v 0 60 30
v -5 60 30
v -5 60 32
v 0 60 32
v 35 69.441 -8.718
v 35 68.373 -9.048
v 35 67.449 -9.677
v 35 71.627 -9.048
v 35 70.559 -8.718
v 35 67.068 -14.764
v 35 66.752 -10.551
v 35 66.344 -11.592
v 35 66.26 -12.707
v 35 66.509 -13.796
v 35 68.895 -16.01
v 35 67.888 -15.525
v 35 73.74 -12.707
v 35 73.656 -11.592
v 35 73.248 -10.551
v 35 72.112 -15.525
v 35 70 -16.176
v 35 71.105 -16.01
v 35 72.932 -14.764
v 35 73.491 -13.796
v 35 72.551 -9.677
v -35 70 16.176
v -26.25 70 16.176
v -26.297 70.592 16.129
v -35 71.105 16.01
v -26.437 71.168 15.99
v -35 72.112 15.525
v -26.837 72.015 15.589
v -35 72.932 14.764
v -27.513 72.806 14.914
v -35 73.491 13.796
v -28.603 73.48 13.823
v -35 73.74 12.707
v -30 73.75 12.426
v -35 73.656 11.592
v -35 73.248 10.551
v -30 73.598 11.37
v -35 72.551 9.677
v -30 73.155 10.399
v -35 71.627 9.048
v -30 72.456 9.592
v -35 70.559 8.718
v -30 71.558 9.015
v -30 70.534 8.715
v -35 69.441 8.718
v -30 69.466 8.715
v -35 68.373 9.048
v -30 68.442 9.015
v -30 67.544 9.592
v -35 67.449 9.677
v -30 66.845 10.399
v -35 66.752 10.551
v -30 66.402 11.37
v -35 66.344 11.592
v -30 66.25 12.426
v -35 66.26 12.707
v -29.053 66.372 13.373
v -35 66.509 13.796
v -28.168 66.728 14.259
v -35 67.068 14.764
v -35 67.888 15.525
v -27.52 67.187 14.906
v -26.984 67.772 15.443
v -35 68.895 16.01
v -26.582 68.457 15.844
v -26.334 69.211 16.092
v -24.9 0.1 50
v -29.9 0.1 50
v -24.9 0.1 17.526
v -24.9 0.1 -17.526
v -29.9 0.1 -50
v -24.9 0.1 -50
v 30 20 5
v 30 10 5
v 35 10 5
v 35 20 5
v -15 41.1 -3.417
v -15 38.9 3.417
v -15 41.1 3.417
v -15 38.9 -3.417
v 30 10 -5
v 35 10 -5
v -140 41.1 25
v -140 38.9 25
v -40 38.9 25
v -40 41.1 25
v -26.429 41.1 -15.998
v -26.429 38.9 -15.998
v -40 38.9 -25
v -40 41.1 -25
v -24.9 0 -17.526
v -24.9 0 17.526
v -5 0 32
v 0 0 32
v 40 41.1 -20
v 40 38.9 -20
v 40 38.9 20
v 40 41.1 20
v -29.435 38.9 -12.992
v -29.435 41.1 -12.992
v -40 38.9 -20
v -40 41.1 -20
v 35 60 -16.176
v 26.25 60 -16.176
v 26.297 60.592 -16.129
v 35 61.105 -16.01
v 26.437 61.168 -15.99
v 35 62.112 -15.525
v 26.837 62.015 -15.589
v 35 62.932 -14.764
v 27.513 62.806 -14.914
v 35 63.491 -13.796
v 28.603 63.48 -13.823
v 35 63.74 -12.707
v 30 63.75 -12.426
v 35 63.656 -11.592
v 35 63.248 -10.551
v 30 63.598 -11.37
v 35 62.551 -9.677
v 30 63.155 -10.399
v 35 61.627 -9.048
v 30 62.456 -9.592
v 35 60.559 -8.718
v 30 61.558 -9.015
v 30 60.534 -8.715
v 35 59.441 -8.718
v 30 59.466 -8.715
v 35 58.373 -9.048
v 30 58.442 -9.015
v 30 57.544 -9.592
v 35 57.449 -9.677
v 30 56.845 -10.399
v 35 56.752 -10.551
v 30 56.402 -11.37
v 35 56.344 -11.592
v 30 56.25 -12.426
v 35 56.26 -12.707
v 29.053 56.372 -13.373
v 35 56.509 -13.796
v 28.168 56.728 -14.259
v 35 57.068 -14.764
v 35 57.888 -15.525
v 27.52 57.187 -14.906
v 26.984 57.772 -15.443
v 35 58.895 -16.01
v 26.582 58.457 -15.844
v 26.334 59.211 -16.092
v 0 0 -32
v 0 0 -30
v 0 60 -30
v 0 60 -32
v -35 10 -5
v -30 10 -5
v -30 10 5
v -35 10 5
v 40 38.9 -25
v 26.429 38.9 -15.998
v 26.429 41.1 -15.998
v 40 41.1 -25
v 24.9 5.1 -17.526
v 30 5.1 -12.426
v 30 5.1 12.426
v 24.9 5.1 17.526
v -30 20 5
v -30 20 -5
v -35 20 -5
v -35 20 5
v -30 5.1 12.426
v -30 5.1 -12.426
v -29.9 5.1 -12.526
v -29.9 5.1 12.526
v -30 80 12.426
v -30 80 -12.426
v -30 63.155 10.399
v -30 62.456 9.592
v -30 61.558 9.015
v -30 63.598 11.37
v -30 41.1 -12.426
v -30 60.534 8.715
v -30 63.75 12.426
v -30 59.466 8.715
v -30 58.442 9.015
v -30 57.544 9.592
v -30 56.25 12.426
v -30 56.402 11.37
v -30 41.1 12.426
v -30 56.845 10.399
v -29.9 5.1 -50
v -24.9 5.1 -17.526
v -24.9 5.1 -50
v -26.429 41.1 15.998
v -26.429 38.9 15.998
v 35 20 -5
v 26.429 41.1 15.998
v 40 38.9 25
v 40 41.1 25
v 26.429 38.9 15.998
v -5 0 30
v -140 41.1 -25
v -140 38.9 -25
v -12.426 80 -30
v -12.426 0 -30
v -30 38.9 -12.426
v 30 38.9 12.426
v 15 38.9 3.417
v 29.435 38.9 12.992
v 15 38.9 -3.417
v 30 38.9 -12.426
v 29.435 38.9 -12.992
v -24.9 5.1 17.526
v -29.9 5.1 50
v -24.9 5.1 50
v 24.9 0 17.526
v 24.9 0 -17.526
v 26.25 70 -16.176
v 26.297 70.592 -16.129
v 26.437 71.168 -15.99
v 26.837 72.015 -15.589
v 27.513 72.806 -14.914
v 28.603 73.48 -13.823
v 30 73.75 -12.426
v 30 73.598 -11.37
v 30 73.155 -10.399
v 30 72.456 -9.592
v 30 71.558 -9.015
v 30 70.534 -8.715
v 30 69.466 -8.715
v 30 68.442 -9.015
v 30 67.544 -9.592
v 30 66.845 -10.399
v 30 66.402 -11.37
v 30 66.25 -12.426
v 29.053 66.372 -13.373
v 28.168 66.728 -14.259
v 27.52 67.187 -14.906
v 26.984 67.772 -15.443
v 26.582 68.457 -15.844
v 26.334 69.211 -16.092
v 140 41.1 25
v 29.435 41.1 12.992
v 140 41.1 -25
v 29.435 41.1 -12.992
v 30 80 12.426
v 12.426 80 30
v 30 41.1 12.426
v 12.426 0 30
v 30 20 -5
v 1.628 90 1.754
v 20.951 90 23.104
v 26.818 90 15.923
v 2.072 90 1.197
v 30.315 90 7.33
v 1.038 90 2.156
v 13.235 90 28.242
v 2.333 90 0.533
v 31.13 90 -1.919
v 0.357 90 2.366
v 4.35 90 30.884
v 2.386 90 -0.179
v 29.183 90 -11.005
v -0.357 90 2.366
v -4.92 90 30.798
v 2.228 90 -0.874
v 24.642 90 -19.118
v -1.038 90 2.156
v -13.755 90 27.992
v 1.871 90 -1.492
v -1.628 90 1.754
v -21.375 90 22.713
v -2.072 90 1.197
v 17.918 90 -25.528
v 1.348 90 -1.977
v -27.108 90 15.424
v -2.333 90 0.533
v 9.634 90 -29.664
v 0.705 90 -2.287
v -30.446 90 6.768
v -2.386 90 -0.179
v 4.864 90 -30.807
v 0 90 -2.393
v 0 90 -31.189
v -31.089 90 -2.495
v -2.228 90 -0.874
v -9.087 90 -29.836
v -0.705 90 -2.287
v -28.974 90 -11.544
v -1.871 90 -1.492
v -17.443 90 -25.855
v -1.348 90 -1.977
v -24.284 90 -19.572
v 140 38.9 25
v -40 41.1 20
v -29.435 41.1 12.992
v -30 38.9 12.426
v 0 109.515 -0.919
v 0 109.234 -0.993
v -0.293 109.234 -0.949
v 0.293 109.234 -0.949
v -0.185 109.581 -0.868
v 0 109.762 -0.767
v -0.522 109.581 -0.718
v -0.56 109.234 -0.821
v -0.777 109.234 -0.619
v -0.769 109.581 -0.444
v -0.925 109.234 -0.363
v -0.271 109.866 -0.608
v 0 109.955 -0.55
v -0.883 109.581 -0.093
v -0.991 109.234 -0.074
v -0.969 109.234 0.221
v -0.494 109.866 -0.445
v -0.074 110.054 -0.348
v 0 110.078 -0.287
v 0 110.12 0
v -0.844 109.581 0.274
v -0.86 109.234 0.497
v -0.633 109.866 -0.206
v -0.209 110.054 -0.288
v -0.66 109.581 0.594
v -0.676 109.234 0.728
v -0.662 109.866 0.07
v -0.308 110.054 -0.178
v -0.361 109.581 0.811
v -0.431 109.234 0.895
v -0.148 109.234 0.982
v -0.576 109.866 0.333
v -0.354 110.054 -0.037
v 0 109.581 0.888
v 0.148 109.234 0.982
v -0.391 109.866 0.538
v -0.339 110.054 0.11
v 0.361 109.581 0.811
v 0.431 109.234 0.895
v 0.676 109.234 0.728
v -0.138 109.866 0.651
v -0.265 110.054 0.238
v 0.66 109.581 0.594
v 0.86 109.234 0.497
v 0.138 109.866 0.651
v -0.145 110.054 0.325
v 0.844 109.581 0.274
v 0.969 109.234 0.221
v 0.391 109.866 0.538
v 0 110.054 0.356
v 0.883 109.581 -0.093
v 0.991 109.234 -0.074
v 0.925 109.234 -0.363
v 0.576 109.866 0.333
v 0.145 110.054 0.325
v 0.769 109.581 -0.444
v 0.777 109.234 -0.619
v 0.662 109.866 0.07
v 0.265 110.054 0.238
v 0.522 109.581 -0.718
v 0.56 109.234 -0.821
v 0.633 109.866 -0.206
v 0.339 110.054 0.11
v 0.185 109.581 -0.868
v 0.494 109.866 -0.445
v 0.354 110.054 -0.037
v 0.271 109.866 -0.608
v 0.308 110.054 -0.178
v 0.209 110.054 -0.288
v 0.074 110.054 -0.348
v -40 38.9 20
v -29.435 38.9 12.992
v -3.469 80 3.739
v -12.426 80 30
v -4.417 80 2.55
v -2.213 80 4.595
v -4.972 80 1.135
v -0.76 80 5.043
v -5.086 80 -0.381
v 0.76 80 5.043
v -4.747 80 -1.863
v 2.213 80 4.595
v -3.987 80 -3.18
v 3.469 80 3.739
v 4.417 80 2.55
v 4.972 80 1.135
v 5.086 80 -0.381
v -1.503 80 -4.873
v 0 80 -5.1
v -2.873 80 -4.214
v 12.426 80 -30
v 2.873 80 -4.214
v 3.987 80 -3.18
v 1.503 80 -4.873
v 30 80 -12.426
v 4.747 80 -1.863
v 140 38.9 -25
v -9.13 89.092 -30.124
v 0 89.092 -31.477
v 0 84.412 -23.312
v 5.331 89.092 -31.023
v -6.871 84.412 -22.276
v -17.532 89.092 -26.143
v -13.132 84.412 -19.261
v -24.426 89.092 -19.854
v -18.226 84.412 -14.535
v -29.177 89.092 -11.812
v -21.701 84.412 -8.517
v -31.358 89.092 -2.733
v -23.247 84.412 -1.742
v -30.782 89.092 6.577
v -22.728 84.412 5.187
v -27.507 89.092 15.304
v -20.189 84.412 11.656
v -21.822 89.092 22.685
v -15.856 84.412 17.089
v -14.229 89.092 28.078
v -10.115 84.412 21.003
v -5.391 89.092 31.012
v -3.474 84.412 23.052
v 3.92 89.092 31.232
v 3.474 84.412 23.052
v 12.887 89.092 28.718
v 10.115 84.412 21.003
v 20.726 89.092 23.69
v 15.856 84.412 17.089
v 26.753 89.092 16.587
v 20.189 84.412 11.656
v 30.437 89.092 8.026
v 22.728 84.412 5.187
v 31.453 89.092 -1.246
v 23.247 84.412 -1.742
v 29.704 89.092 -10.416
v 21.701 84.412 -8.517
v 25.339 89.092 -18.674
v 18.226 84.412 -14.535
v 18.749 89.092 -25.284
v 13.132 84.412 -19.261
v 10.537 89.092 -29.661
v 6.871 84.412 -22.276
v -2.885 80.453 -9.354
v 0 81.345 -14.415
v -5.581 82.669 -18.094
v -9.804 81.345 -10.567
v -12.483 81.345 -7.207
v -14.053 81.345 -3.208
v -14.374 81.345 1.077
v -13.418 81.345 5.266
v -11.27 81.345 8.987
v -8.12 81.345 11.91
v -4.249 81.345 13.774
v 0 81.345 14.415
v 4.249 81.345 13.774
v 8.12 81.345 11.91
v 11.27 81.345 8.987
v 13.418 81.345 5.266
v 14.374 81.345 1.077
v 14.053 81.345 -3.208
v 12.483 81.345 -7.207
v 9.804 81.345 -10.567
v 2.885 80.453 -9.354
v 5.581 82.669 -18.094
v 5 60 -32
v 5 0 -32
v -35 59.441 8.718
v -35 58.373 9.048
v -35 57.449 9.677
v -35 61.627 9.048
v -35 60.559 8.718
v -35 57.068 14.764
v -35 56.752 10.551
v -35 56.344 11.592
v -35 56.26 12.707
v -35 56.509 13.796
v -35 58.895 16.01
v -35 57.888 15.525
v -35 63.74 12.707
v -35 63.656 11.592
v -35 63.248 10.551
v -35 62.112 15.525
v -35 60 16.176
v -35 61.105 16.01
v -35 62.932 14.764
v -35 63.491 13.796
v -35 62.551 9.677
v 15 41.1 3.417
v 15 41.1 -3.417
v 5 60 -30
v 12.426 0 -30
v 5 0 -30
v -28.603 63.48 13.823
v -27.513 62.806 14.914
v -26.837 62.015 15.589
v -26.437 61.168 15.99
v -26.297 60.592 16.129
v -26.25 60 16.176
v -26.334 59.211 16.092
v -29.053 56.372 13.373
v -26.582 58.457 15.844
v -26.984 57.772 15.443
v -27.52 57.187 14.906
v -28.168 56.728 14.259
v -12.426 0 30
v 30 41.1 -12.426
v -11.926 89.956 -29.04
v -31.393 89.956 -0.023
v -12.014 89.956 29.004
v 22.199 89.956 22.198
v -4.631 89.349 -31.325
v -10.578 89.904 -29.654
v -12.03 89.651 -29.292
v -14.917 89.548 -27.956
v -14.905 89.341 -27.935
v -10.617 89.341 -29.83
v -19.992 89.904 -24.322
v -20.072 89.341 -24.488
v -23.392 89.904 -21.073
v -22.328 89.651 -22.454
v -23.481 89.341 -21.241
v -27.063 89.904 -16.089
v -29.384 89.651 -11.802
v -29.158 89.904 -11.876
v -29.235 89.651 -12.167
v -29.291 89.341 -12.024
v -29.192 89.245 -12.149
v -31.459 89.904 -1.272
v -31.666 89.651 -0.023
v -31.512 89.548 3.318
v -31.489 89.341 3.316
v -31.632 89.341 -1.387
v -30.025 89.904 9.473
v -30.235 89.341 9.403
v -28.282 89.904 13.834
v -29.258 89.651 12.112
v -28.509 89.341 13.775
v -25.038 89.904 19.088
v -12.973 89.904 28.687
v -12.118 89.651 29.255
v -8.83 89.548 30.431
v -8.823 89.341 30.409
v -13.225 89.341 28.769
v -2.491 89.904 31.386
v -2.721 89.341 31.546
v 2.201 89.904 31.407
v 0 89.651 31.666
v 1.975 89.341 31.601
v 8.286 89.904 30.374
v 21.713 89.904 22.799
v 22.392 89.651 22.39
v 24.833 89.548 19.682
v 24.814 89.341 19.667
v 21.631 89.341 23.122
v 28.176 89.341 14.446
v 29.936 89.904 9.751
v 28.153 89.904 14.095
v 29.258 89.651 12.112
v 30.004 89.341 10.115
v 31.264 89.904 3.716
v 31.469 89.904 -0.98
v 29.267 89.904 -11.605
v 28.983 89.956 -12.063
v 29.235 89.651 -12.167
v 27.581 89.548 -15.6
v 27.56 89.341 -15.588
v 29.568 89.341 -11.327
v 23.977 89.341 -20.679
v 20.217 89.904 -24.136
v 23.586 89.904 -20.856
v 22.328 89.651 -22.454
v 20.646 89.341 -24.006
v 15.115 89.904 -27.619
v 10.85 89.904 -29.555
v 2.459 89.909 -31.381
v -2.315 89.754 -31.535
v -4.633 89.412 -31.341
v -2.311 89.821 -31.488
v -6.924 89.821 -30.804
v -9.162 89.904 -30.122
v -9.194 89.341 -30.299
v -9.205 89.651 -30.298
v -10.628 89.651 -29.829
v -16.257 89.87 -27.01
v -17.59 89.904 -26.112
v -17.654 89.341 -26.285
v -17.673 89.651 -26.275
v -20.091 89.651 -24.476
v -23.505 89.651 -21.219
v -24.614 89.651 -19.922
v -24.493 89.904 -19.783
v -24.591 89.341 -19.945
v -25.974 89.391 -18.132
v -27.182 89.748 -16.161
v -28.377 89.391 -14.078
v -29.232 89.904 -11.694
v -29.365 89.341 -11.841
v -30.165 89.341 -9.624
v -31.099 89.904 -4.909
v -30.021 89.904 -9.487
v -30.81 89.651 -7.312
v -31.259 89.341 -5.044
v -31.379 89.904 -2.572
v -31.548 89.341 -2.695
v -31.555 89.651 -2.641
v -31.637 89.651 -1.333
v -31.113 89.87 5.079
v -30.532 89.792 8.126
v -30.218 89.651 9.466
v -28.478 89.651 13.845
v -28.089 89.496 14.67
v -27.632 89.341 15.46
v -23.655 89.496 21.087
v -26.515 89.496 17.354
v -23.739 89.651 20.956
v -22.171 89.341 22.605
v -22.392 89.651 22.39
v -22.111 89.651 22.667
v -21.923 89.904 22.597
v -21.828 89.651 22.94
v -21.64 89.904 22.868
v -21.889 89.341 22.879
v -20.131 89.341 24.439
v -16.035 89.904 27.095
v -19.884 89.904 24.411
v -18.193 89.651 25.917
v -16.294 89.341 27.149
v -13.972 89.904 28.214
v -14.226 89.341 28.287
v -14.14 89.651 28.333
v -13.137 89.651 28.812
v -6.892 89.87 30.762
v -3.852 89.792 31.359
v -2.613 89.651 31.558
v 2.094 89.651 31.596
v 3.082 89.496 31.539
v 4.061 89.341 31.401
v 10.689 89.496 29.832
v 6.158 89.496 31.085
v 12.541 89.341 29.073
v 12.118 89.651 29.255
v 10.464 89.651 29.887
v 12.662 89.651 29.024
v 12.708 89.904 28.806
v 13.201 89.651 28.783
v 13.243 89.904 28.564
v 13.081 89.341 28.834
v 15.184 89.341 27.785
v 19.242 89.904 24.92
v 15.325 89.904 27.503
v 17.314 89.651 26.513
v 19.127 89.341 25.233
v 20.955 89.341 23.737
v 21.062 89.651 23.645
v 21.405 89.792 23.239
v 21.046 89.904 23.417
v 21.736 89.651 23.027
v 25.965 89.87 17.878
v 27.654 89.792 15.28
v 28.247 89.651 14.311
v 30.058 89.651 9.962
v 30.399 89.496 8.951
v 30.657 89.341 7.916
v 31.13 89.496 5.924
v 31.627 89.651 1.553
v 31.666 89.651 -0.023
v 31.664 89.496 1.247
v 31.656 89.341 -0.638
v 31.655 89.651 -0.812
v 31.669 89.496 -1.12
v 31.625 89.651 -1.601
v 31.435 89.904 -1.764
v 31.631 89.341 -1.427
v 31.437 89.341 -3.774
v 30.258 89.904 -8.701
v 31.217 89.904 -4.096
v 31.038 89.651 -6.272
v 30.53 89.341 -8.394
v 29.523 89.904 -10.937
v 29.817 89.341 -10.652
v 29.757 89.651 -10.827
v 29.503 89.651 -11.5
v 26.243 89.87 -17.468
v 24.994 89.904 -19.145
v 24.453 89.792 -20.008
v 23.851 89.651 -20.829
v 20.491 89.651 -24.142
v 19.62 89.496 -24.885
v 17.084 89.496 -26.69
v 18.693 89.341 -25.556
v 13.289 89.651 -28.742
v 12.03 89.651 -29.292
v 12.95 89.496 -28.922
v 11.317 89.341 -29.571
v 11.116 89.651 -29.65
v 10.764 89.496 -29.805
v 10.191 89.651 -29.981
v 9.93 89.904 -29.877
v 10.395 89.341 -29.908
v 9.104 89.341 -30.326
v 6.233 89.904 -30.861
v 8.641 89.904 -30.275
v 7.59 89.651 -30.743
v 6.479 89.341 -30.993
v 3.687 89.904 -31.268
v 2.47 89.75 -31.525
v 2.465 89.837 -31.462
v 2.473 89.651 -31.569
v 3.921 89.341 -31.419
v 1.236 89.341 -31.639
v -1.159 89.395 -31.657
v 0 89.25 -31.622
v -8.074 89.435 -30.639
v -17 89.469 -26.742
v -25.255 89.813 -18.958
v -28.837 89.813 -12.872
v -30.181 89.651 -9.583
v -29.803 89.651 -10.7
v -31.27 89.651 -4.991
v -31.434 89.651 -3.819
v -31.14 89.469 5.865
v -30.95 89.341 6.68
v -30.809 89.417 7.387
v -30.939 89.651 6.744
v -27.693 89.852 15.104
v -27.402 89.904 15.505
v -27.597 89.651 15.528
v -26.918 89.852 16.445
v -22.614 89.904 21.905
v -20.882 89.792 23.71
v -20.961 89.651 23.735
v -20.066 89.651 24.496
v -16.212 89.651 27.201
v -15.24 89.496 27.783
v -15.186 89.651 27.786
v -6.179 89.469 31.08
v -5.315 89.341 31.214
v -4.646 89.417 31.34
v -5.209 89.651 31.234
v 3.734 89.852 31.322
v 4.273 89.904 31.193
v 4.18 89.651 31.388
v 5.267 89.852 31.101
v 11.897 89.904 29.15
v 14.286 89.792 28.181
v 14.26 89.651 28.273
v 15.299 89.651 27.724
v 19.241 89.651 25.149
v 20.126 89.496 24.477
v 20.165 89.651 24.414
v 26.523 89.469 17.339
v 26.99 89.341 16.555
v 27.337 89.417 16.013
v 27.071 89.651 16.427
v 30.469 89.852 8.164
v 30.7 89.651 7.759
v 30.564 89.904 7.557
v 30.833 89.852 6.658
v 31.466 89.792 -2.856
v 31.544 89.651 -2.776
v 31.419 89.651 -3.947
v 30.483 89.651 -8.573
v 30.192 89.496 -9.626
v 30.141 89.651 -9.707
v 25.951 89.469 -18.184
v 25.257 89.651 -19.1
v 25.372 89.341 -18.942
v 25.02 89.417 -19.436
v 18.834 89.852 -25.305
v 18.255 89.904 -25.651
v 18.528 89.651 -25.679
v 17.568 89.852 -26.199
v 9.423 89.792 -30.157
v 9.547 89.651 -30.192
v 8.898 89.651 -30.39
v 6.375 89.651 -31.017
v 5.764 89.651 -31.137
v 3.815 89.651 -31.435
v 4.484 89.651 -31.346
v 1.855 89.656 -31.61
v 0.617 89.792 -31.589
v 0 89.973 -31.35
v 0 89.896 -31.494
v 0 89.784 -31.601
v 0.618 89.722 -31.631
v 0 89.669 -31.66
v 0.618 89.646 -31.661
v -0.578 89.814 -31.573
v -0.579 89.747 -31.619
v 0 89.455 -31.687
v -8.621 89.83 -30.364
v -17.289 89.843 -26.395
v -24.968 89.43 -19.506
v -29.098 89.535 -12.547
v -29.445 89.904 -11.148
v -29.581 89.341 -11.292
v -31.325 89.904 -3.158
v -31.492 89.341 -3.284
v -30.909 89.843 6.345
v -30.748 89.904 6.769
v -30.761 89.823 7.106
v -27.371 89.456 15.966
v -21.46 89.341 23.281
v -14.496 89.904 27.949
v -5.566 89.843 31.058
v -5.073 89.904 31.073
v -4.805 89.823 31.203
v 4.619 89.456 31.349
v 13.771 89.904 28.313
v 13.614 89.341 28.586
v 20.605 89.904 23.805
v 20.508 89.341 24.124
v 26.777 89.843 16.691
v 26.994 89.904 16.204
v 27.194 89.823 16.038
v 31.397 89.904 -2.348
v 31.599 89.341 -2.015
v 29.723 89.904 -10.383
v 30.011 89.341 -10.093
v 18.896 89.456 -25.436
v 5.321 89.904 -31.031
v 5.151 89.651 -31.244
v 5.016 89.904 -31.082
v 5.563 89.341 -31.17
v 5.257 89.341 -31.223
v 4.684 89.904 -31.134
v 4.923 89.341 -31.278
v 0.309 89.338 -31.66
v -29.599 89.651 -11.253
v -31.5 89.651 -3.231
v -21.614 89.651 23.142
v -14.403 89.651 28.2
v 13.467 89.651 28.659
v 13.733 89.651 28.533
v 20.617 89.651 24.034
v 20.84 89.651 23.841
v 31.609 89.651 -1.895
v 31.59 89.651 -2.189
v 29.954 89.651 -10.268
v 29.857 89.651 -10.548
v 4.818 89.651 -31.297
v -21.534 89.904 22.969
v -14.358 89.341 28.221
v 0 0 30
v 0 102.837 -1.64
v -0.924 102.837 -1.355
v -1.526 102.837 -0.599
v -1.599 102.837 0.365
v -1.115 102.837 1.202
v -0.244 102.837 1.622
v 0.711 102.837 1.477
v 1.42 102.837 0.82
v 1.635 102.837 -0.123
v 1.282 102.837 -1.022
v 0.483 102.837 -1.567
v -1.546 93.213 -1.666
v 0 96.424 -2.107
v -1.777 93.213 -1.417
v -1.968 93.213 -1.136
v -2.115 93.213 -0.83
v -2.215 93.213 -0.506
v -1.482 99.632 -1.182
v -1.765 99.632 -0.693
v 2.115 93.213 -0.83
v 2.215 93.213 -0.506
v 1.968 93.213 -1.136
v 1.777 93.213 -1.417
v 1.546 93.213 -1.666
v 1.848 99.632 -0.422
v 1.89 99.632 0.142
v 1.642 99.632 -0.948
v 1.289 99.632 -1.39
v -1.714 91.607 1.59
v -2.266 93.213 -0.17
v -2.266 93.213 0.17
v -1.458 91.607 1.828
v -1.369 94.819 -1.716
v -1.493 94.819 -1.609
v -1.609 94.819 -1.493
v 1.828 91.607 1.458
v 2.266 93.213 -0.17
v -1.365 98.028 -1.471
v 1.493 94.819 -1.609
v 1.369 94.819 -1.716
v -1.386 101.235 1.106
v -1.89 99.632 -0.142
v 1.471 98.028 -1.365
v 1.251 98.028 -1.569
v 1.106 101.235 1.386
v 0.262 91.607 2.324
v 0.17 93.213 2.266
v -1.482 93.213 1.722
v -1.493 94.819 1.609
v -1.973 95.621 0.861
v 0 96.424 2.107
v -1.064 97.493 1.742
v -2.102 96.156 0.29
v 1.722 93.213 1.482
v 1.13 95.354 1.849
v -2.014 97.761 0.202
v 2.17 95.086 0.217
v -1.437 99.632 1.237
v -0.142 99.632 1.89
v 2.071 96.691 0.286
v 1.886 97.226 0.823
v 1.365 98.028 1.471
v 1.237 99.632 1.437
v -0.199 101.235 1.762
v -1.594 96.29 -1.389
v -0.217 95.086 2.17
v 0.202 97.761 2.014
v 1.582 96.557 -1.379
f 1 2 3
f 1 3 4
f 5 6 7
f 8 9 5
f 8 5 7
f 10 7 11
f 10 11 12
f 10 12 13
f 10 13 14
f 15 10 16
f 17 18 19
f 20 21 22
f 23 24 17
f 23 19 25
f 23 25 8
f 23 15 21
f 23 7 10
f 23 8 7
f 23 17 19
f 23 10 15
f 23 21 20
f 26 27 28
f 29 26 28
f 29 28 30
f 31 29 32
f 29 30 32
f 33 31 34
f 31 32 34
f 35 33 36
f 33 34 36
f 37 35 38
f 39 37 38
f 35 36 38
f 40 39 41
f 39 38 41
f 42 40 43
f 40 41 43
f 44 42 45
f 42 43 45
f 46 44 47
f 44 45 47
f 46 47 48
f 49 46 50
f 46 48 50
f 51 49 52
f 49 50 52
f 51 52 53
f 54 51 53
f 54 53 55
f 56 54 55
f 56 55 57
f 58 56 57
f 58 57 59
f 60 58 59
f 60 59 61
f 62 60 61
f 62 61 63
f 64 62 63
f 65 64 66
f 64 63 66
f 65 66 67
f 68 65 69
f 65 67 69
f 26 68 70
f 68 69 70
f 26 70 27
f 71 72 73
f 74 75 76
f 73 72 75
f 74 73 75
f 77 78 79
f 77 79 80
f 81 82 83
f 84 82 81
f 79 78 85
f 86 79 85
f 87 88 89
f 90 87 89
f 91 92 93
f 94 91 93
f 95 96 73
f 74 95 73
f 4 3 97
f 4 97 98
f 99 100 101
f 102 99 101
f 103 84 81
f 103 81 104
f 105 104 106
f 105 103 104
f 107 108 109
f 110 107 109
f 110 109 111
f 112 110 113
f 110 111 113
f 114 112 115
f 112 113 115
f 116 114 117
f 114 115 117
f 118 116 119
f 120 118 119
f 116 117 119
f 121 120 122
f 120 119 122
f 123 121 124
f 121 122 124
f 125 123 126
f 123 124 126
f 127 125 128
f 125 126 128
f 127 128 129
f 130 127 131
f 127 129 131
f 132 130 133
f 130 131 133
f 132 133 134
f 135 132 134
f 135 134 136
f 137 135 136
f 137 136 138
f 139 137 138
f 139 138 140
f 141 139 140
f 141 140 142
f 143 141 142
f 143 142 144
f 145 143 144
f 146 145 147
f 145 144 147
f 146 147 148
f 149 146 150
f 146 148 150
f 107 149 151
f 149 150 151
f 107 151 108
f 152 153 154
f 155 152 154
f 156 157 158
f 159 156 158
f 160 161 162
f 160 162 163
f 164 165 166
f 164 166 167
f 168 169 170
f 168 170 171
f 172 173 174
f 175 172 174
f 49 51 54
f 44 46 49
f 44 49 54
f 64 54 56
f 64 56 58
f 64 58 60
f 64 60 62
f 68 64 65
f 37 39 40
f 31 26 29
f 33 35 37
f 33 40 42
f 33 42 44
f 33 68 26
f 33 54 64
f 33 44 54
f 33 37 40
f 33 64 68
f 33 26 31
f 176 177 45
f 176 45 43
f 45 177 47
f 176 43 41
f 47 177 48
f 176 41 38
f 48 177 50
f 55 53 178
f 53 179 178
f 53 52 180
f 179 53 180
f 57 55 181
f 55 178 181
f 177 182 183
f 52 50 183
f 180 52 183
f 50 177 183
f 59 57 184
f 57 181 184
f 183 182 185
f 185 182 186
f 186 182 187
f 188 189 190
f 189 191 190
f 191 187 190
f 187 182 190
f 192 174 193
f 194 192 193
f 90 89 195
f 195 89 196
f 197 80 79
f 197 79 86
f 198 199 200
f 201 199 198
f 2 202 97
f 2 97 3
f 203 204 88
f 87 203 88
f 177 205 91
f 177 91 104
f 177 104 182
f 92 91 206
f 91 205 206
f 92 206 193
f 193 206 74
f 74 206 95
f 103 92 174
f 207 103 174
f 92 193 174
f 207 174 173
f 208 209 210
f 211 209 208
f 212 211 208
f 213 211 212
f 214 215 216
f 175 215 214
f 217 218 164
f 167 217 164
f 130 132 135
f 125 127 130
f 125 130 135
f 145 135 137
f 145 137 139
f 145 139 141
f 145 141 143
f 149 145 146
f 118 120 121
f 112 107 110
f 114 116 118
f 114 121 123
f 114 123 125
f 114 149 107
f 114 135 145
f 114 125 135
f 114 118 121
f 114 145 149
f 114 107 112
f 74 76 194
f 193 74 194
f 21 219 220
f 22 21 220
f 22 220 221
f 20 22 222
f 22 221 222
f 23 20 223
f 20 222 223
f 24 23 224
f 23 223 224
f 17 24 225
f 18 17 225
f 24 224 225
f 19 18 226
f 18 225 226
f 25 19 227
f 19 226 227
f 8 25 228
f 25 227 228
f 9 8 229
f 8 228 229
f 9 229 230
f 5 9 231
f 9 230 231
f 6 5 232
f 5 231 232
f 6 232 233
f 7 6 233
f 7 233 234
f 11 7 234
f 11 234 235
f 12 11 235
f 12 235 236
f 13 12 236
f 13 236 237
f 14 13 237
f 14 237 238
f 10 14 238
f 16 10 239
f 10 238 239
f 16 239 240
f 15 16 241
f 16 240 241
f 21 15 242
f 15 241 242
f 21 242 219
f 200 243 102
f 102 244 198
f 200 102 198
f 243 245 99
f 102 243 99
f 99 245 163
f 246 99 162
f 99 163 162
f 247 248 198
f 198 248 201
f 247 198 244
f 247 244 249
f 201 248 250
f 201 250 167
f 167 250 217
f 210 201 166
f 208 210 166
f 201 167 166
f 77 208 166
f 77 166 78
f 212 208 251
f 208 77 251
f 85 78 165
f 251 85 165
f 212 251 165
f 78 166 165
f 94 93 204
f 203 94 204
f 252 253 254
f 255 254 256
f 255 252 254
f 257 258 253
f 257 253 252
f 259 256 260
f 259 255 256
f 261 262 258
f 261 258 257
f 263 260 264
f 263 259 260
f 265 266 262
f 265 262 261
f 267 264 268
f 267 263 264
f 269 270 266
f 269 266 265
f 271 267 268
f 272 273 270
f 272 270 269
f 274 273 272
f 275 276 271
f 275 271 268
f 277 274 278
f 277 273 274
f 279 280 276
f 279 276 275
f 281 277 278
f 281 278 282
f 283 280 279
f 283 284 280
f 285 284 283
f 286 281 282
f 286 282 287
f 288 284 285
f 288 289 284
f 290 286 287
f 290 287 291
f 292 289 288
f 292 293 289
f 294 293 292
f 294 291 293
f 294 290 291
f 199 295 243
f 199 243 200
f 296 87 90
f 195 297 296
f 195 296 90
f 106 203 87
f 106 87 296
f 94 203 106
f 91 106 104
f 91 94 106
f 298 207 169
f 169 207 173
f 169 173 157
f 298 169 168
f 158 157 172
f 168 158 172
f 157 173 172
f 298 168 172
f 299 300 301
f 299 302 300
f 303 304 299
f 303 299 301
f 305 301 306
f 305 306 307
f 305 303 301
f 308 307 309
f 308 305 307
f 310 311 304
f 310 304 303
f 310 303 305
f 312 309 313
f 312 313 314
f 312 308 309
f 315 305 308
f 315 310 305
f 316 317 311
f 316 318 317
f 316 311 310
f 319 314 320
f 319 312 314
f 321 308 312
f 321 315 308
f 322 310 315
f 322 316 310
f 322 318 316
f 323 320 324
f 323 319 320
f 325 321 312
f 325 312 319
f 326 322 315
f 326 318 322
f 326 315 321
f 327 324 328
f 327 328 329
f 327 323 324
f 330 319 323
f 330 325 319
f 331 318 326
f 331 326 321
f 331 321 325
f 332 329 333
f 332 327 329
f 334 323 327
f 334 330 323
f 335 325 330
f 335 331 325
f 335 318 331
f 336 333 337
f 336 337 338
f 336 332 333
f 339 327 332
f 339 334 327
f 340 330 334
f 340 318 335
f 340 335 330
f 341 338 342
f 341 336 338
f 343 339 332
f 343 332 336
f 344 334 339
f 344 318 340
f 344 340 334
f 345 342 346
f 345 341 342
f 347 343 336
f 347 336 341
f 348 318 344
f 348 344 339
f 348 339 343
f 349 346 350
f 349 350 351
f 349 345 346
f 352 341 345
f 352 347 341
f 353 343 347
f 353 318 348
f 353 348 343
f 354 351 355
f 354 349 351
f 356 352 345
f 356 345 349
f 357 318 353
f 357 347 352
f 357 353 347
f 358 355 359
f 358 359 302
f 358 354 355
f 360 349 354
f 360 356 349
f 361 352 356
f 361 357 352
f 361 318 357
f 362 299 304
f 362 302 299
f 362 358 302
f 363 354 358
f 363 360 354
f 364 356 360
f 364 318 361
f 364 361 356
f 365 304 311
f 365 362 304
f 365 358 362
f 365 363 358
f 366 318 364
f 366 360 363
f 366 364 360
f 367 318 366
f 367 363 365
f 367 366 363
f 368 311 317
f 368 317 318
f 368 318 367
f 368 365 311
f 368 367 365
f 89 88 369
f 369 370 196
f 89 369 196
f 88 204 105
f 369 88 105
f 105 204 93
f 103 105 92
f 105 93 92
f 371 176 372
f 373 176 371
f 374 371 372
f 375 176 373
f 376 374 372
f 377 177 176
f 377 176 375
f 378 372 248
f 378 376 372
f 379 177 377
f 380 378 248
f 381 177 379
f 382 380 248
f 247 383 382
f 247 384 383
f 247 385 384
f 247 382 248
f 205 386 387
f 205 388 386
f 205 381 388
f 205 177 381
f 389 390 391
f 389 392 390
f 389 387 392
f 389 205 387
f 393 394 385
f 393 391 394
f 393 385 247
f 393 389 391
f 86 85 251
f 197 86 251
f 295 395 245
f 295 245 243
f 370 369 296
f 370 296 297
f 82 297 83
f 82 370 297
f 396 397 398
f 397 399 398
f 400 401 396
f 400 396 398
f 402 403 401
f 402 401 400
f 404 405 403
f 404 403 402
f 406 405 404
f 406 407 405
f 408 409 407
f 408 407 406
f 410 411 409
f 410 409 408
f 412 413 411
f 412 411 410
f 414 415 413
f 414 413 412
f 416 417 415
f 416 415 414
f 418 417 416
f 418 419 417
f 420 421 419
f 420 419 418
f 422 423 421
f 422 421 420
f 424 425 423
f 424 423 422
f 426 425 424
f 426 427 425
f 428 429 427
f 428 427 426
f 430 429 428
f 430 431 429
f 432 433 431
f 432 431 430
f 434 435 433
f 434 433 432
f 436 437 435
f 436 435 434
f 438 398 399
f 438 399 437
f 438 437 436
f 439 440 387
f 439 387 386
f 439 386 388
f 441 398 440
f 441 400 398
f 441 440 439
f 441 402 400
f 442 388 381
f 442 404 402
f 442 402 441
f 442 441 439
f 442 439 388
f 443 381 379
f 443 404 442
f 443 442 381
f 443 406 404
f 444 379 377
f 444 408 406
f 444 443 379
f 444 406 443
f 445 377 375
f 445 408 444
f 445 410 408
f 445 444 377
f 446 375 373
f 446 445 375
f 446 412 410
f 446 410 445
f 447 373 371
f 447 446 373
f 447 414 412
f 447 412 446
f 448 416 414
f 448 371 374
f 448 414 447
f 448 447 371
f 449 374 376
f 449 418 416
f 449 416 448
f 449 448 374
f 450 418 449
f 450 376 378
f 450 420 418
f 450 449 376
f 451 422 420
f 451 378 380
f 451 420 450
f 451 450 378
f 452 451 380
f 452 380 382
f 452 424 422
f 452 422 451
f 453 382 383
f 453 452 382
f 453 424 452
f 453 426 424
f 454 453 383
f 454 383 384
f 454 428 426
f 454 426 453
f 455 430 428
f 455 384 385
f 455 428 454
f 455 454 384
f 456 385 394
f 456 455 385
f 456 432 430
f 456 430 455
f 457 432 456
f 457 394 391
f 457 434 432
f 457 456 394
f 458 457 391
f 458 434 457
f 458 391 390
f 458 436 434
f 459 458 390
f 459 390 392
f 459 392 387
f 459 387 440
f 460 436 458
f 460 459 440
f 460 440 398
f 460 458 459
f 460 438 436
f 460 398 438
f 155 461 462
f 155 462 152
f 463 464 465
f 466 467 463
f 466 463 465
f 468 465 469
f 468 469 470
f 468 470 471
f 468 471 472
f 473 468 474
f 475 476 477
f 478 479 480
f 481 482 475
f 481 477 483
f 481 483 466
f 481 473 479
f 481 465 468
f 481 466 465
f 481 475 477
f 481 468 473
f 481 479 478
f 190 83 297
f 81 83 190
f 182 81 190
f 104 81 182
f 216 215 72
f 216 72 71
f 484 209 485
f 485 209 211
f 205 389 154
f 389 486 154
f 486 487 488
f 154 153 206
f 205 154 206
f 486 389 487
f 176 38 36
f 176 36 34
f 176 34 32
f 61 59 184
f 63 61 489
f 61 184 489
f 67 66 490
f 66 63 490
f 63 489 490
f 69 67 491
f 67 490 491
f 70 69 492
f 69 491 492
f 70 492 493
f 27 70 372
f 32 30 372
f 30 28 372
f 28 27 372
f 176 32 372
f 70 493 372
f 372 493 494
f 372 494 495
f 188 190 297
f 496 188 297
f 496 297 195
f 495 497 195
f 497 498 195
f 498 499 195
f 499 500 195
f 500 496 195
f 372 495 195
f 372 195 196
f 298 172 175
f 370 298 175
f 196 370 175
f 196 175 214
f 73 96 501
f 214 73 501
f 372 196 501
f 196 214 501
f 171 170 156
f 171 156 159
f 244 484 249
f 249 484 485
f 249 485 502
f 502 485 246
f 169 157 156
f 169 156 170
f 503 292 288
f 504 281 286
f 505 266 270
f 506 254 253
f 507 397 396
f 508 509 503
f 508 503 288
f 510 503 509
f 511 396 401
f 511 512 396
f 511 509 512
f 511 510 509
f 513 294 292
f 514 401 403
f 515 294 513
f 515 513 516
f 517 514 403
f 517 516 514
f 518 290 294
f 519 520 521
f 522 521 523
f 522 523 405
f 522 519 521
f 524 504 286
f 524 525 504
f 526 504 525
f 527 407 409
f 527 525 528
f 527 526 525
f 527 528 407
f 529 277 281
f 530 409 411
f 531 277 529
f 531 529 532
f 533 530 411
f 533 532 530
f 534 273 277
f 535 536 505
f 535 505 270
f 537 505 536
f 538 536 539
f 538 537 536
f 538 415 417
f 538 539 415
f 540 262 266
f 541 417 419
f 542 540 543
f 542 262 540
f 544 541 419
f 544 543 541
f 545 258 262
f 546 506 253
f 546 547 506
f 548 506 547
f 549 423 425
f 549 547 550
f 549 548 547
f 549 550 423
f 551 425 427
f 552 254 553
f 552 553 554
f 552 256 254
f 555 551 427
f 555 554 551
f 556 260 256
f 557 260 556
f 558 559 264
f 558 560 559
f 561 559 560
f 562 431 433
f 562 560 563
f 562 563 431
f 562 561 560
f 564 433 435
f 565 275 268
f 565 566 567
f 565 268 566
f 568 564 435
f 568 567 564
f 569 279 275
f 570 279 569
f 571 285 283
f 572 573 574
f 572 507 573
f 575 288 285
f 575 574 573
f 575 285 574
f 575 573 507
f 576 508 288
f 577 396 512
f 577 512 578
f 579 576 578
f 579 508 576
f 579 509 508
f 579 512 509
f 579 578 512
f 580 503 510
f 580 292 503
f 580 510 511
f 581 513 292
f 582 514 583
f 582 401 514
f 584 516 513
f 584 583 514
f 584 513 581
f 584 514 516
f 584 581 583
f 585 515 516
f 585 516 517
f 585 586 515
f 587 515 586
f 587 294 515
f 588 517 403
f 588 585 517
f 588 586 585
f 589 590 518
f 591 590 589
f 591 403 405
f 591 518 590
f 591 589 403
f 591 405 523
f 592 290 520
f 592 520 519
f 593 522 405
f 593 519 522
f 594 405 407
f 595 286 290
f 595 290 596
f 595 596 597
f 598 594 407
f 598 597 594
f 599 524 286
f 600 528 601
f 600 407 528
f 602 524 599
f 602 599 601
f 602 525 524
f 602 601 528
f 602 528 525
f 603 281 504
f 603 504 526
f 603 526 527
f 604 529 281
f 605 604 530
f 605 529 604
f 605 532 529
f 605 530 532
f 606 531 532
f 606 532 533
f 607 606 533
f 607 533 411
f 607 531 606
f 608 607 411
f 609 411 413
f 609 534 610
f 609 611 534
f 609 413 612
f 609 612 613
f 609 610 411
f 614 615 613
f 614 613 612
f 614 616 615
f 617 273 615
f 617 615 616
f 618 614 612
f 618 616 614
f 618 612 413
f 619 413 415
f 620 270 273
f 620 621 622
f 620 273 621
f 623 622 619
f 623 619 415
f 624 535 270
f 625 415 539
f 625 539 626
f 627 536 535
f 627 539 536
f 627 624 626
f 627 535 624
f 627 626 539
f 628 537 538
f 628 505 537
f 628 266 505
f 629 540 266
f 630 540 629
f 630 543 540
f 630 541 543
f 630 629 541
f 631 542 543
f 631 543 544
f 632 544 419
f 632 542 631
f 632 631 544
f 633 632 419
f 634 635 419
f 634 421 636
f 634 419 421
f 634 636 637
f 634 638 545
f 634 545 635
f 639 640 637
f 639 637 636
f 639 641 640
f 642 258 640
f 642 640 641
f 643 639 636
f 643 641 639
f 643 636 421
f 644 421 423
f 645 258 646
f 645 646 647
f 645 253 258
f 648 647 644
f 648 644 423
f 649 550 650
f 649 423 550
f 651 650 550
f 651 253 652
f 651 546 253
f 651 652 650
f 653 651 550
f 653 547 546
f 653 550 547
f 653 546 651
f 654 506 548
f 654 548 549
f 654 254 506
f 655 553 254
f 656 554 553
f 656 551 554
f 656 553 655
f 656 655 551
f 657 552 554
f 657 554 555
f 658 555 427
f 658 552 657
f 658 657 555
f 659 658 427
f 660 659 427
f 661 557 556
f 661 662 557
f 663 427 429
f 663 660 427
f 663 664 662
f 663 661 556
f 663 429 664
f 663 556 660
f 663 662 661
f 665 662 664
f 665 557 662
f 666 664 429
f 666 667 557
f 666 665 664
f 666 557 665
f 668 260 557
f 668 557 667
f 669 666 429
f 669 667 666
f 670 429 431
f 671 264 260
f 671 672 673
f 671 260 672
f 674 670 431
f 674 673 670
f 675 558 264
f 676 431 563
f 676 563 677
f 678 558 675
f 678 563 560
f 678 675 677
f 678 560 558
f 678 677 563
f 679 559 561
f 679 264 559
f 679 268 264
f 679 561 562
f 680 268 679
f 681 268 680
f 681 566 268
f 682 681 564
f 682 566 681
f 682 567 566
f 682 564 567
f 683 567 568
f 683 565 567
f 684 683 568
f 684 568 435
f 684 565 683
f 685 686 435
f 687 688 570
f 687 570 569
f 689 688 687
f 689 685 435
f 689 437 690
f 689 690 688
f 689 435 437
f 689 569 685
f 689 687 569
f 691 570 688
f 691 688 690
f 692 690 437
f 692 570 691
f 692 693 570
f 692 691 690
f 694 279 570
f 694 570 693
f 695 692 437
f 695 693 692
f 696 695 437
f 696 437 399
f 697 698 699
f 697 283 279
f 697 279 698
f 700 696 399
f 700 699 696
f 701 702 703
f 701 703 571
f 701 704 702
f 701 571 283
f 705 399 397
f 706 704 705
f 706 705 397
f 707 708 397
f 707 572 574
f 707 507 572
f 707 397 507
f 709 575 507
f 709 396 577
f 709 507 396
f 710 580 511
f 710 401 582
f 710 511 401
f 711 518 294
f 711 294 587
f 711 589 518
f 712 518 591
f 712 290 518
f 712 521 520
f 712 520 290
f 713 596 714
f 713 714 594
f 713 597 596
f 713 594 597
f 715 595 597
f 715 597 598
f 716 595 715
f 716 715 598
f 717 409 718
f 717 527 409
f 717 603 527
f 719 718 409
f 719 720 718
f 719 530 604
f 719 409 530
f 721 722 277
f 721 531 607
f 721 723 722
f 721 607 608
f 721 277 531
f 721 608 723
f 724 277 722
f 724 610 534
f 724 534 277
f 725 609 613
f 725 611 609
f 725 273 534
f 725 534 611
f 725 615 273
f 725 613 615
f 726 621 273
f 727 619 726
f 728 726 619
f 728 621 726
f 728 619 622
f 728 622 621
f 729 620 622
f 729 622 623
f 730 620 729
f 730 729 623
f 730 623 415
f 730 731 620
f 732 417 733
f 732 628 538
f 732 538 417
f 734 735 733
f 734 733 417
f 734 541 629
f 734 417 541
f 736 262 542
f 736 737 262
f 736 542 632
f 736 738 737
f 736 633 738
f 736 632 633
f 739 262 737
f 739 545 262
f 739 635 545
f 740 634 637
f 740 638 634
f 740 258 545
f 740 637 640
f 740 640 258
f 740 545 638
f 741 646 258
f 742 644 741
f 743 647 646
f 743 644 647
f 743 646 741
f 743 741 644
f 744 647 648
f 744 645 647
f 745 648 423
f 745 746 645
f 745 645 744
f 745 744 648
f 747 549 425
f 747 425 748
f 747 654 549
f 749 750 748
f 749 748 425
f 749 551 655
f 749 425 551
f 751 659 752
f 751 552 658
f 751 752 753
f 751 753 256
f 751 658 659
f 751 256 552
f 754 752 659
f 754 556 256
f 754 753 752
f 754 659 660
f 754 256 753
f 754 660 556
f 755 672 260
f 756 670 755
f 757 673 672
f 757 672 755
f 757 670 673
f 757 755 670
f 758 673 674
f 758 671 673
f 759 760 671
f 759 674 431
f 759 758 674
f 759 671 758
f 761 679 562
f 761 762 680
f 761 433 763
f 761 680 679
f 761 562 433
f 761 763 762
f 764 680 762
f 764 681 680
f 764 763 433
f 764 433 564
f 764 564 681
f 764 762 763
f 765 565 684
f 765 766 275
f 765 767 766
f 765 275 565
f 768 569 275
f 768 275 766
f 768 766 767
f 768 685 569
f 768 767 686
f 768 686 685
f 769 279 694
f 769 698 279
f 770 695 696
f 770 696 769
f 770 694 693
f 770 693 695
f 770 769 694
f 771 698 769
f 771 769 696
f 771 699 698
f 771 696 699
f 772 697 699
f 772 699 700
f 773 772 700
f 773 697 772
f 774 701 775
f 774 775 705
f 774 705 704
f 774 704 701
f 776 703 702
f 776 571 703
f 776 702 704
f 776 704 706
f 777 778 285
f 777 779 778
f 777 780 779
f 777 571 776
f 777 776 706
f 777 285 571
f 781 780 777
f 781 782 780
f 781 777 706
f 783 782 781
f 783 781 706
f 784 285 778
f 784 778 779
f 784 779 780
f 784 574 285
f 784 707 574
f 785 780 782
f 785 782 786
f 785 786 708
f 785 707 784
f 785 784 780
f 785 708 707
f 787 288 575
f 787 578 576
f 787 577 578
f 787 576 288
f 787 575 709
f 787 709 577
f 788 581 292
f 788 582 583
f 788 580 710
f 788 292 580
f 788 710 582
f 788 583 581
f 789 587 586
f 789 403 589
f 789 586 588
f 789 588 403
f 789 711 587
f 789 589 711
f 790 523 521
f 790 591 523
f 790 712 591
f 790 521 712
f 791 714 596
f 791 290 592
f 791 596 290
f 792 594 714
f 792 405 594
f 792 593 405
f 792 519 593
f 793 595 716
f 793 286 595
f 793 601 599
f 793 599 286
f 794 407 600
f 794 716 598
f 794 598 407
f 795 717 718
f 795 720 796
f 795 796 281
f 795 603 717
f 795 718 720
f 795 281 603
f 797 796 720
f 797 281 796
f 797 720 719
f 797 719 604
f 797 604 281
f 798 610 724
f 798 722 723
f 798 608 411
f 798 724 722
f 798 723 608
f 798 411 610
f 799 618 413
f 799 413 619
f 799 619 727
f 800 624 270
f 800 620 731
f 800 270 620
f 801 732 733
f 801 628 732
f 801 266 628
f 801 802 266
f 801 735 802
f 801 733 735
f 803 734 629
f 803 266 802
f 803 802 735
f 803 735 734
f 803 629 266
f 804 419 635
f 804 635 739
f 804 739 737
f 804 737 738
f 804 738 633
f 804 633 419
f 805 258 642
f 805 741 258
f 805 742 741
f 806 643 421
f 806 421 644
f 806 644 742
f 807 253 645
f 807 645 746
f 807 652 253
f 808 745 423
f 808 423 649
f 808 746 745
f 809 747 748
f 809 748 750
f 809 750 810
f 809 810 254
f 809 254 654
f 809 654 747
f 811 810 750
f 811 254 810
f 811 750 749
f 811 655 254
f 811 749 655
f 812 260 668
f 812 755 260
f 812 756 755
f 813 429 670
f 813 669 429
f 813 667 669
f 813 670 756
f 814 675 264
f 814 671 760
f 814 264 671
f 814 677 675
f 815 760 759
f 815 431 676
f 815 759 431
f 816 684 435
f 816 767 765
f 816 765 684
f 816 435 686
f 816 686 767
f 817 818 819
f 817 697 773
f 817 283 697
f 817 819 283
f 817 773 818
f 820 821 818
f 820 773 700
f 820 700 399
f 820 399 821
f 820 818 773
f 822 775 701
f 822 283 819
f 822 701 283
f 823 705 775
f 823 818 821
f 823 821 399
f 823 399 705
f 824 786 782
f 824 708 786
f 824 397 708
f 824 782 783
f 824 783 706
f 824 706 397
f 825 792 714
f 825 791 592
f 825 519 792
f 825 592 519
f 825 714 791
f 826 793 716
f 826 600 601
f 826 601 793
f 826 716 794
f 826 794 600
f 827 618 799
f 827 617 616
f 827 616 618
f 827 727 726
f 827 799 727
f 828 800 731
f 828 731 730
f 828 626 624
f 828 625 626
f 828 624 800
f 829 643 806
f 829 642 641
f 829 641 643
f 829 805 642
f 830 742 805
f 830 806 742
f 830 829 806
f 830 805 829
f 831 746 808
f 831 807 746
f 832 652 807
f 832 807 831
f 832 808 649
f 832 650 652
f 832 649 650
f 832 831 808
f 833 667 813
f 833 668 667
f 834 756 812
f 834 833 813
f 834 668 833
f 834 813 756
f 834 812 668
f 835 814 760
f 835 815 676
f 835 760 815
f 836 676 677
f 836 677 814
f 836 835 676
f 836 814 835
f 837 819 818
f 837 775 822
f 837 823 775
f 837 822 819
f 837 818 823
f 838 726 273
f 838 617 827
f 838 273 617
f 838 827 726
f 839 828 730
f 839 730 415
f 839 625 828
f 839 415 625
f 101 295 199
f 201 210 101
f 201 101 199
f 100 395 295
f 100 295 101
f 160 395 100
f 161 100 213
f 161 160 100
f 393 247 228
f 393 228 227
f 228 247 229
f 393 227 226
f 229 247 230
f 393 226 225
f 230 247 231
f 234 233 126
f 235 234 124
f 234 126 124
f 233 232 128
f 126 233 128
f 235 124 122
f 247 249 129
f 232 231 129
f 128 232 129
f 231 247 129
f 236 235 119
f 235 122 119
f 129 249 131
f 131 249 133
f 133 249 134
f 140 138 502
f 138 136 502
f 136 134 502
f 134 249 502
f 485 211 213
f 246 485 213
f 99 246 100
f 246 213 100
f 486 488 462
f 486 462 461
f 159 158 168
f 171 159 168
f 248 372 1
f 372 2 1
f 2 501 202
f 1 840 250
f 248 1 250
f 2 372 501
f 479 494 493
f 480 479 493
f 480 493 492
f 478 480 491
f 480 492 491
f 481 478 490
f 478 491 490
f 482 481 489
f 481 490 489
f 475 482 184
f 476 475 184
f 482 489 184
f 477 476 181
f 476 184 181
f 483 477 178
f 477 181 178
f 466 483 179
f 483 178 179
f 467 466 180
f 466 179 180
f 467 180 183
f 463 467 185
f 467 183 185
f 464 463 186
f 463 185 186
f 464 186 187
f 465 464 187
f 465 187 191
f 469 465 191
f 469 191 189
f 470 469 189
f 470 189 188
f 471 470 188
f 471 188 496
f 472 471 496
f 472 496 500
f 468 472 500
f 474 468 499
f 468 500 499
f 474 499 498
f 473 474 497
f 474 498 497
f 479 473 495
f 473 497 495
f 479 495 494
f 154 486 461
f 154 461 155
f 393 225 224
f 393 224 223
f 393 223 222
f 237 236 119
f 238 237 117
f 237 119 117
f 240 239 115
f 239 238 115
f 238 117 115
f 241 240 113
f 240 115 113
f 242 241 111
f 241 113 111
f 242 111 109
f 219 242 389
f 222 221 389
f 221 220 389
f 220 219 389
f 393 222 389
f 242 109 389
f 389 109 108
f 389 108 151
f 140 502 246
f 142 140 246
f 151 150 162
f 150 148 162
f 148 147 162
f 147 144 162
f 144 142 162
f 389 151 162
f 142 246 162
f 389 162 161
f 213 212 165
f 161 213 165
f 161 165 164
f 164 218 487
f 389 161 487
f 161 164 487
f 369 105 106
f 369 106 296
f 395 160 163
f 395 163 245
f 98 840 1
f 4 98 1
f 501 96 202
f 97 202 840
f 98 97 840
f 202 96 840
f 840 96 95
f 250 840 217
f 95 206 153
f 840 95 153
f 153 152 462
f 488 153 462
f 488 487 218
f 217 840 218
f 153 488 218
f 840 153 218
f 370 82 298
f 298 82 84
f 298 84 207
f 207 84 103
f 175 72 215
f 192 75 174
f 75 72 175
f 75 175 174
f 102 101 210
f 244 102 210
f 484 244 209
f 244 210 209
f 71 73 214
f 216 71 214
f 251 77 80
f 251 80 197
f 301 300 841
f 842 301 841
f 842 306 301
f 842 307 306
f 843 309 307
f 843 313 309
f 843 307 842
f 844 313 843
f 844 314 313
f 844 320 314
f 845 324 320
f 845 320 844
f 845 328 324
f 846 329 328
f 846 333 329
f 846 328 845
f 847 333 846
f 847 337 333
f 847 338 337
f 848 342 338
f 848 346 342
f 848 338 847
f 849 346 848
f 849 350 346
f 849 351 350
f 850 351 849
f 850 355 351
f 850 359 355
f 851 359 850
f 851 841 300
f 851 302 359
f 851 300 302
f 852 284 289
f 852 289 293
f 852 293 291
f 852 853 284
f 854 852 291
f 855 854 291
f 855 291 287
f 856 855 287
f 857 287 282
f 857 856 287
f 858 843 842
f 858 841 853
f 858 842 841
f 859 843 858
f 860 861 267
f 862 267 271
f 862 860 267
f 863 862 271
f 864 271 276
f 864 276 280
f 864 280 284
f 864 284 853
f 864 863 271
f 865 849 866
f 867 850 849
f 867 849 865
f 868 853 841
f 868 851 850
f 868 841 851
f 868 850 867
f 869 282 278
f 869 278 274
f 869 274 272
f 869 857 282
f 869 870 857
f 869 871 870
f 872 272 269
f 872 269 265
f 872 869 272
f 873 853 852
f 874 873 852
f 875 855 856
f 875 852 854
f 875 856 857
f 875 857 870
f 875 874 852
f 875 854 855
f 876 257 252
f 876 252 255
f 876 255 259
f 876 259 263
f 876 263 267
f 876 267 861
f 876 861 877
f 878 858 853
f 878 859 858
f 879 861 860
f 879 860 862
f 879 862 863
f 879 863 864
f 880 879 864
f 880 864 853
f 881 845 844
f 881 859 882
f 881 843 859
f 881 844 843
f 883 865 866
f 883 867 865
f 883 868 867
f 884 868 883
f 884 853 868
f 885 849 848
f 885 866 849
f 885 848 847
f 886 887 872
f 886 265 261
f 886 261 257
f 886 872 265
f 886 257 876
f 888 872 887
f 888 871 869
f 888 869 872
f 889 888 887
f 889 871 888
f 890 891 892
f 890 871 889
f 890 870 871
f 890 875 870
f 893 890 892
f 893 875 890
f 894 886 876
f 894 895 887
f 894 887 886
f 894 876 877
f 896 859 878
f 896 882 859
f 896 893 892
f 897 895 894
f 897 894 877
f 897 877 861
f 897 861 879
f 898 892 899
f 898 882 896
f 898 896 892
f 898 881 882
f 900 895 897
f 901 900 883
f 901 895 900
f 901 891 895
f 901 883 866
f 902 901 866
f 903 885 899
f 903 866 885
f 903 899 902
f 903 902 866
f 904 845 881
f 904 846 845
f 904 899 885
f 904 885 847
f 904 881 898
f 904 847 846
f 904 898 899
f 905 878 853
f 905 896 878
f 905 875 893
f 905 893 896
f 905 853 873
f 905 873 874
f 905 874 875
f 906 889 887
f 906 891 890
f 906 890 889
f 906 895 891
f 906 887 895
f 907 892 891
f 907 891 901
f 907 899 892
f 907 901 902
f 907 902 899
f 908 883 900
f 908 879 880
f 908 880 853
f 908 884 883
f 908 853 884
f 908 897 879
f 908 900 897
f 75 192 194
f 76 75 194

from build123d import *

# Parameters (mm, degrees)
BOSS_EXTRUDE1_DEPTH      = 80
CUT_EXTRUDE1_DEPTH       = 1.1
SKETCH5_R                = 5.1
CUT_EXTRUDE3_DEPTH       = 12
BOSS_EXTRUDE2_START      = -12
SKETCH6_R                = 3.75
SKETCH6_W                = 10
SKETCH6_H                = 10
BOSS_EXTRUDE2_DEPTH      = 17
SKETCH7_W                = 5
SKETCH7_H                = 60
BOSS_EXTRUDE3_DEPTH      = 2
SKETCH8_W                = 5.1
SKETCH8_H                = 5.1
CUT_EXTRUDE4_DEPTH       = 106.948100502
BOSS_EXTRUDE4_DEPTH      = 2.2
CIRPATTERN1_COUNT        = 2
FILLET1_R                = 0.5
BOSS_EXTRUDE5_DEPTH      = 50
BOSS_EXTRUDE5_DEPTH_BACK = 50
SKETCH11_W               = 5
SKETCH11_H               = 5


with BuildPart() as part:
    # Sketch1 → Boss-Extrude1 (new body)
    with BuildSketch(Plane(origin=(0, 0, 0), x_dir=(1, 0, 0), z_dir=(0, 1, 0))):
        Polygon((12.426406871, -30), (30, -12.426406871), (30, 12.426406871), (12.426406871, 30), (-12.426406871, 30), (-30, 12.426406871), (-30, -12.426406871), (-12.426406871, -30), align=None)
    extrude(amount=BOSS_EXTRUDE1_DEPTH)

    # Sketch3 → Cut-Extrude1 (cut, symmetric)
    with BuildSketch(Plane(origin=(0, 40, 0), x_dir=(1, 0, 0), z_dir=(0, 1, 0))):
        Polygon((40, 25), (10, 5.1), (10, -5.1), (40, -25), align=None)
    cut_extrude1 = extrude(amount=CUT_EXTRUDE1_DEPTH, both=True, mode=Mode.SUBTRACT)

    # Mirror1: Cut-Extrude1 across plane
    add(cut_extrude1.mirror(Plane(origin=(0, 0, 0), x_dir=(0, 0, 1), z_dir=(1, 0, 0))), mode=Mode.SUBTRACT)

    # Sketch5 → Cut-Extrude3 (cut)
    with BuildSketch(Plane(origin=(0, 80, 0), x_dir=(1, 0, 0), z_dir=(0, 1, 0))):
        with Locations(Location((0, 0, 0), (0, 0, 270))):
            Circle(SKETCH5_R)
    extrude(amount=-CUT_EXTRUDE3_DEPTH, mode=Mode.SUBTRACT)

    # Sketch6 → Boss-Extrude2 (add)
    with BuildSketch(Plane.ZY.offset(30).offset(BOSS_EXTRUDE2_START)):
        with Locations((12.426406871, 70)):
            Circle(SKETCH6_R)
        with Locations((12.426406871, 60)):
            Circle(SKETCH6_R)
        with Locations((0, 15)):
            Rectangle(SKETCH6_W, SKETCH6_H)
    boss_extrude2 = extrude(amount=BOSS_EXTRUDE2_DEPTH)

    # Sketch7 → Boss-Extrude3 (add)
    with BuildSketch(Plane.XY.offset(30)):
        with Locations((-2.5, 30)):
            Rectangle(SKETCH7_W, SKETCH7_H)
    boss_extrude3 = extrude(amount=BOSS_EXTRUDE3_DEPTH)

    # Sketch8 → Cut-Extrude4 (cut, through all)
    with BuildSketch(Plane.XY.offset(30)):
        with Locations((-27.45, 2.55)):
            Rectangle(SKETCH8_W, SKETCH8_H)
    cut_extrude4 = extrude(amount=-CUT_EXTRUDE4_DEPTH, mode=Mode.SUBTRACT)

    # Sketch9 → Boss-Extrude4 (add)
    # profile 1 of 2: a face of its own
    with BuildSketch(Plane(origin=(0, 38.9, 0), x_dir=(1, 0, 0), z_dir=(0, 1, 0))):
        Polygon((-10, -5.1), (-10, 5.1), (-40, 25), (-140, 25), (-140, -25), (-40, -25), align=None)
        Polygon((-40, 20), (-40, -20), (-15, -3.416666667), (-15, 3.416666667), align=None, mode=Mode.SUBTRACT)
    # profile 2 of 2: a face of its own
    with BuildSketch(Plane(origin=(0, 38.9, 0), x_dir=(1, 0, 0), z_dir=(0, 1, 0))):
        Polygon((140, -25), (40, -25), (10, -5.1), (10, 5.1), (40, 25), (140, 25), align=None)
        Polygon((15, 3.416666667), (40, 20), (40, -20), (15, -3.416666667), align=None, mode=Mode.SUBTRACT)
    extrude(amount=BOSS_EXTRUDE4_DEPTH)

    # CirPattern1: Boss-Extrude2, Boss-Extrude3, Cut-Extrude4 ×2 about axis
    cirpattern1_axis = Axis((0, 0, 0), (0, 1, 0))
    add([boss_extrude2.rotate(cirpattern1_axis, i * 360 / CIRPATTERN1_COUNT) for i in range(1, CIRPATTERN1_COUNT)])
    add([boss_extrude3.rotate(cirpattern1_axis, i * 360 / CIRPATTERN1_COUNT) for i in range(1, CIRPATTERN1_COUNT)])
    add([cut_extrude4.rotate(cirpattern1_axis, i * 360 / CIRPATTERN1_COUNT) for i in range(1, CIRPATTERN1_COUNT)], mode=Mode.SUBTRACT)

    # Sketch10 → Revolve2 (revolve)
    with BuildSketch(Plane.XY, mode=Mode.PRIVATE) as revolve2_sk:
        with BuildLine():
            Line((32.723066645, 90), (2.393066645, 90))
            ThreePointArc((2.393066645, 90), (1.895667326, 99.631968124), (0.993425901, 109.234476985))
            ThreePointArc((0.993425901, 109.234476985), (0.665403267, 109.866484087), (0, 110.12))
            Line((0, 110.12), (0, 68))
            Line((0, 68), (5.1, 68))
            Line((5.1, 68), (5.1, 80))
            ThreePointArc((5.1, 80), (19.662538377, 82.925493733), (32.723066645, 90))
        make_face()
    revolve(revolve2_sk.sketch.rotate(Axis((0, 68, 0), (0, 1, 0)), 90), axis=Axis((0, 68, 0), (0, 1, 0)))

    # Fillet1
    fillet1_edges = [part.edges().sort_by_distance(p)[0] for p in [
        (0, 90, 32.723066645),
    ]]
    fillet(fillet1_edges, radius=FILLET1_R)

    # Sketch11 → Boss-Extrude5 (add, two sides: drawn at the far end of the back side and taken through both)
    with BuildSketch(Plane.XY.offset(-BOSS_EXTRUDE5_DEPTH_BACK)):
        with Locations((-27.4, 2.6)):
            Rectangle(SKETCH11_W, SKETCH11_H)
    extrude(amount=BOSS_EXTRUDE5_DEPTH + BOSS_EXTRUDE5_DEPTH_BACK)


solid = part.part
